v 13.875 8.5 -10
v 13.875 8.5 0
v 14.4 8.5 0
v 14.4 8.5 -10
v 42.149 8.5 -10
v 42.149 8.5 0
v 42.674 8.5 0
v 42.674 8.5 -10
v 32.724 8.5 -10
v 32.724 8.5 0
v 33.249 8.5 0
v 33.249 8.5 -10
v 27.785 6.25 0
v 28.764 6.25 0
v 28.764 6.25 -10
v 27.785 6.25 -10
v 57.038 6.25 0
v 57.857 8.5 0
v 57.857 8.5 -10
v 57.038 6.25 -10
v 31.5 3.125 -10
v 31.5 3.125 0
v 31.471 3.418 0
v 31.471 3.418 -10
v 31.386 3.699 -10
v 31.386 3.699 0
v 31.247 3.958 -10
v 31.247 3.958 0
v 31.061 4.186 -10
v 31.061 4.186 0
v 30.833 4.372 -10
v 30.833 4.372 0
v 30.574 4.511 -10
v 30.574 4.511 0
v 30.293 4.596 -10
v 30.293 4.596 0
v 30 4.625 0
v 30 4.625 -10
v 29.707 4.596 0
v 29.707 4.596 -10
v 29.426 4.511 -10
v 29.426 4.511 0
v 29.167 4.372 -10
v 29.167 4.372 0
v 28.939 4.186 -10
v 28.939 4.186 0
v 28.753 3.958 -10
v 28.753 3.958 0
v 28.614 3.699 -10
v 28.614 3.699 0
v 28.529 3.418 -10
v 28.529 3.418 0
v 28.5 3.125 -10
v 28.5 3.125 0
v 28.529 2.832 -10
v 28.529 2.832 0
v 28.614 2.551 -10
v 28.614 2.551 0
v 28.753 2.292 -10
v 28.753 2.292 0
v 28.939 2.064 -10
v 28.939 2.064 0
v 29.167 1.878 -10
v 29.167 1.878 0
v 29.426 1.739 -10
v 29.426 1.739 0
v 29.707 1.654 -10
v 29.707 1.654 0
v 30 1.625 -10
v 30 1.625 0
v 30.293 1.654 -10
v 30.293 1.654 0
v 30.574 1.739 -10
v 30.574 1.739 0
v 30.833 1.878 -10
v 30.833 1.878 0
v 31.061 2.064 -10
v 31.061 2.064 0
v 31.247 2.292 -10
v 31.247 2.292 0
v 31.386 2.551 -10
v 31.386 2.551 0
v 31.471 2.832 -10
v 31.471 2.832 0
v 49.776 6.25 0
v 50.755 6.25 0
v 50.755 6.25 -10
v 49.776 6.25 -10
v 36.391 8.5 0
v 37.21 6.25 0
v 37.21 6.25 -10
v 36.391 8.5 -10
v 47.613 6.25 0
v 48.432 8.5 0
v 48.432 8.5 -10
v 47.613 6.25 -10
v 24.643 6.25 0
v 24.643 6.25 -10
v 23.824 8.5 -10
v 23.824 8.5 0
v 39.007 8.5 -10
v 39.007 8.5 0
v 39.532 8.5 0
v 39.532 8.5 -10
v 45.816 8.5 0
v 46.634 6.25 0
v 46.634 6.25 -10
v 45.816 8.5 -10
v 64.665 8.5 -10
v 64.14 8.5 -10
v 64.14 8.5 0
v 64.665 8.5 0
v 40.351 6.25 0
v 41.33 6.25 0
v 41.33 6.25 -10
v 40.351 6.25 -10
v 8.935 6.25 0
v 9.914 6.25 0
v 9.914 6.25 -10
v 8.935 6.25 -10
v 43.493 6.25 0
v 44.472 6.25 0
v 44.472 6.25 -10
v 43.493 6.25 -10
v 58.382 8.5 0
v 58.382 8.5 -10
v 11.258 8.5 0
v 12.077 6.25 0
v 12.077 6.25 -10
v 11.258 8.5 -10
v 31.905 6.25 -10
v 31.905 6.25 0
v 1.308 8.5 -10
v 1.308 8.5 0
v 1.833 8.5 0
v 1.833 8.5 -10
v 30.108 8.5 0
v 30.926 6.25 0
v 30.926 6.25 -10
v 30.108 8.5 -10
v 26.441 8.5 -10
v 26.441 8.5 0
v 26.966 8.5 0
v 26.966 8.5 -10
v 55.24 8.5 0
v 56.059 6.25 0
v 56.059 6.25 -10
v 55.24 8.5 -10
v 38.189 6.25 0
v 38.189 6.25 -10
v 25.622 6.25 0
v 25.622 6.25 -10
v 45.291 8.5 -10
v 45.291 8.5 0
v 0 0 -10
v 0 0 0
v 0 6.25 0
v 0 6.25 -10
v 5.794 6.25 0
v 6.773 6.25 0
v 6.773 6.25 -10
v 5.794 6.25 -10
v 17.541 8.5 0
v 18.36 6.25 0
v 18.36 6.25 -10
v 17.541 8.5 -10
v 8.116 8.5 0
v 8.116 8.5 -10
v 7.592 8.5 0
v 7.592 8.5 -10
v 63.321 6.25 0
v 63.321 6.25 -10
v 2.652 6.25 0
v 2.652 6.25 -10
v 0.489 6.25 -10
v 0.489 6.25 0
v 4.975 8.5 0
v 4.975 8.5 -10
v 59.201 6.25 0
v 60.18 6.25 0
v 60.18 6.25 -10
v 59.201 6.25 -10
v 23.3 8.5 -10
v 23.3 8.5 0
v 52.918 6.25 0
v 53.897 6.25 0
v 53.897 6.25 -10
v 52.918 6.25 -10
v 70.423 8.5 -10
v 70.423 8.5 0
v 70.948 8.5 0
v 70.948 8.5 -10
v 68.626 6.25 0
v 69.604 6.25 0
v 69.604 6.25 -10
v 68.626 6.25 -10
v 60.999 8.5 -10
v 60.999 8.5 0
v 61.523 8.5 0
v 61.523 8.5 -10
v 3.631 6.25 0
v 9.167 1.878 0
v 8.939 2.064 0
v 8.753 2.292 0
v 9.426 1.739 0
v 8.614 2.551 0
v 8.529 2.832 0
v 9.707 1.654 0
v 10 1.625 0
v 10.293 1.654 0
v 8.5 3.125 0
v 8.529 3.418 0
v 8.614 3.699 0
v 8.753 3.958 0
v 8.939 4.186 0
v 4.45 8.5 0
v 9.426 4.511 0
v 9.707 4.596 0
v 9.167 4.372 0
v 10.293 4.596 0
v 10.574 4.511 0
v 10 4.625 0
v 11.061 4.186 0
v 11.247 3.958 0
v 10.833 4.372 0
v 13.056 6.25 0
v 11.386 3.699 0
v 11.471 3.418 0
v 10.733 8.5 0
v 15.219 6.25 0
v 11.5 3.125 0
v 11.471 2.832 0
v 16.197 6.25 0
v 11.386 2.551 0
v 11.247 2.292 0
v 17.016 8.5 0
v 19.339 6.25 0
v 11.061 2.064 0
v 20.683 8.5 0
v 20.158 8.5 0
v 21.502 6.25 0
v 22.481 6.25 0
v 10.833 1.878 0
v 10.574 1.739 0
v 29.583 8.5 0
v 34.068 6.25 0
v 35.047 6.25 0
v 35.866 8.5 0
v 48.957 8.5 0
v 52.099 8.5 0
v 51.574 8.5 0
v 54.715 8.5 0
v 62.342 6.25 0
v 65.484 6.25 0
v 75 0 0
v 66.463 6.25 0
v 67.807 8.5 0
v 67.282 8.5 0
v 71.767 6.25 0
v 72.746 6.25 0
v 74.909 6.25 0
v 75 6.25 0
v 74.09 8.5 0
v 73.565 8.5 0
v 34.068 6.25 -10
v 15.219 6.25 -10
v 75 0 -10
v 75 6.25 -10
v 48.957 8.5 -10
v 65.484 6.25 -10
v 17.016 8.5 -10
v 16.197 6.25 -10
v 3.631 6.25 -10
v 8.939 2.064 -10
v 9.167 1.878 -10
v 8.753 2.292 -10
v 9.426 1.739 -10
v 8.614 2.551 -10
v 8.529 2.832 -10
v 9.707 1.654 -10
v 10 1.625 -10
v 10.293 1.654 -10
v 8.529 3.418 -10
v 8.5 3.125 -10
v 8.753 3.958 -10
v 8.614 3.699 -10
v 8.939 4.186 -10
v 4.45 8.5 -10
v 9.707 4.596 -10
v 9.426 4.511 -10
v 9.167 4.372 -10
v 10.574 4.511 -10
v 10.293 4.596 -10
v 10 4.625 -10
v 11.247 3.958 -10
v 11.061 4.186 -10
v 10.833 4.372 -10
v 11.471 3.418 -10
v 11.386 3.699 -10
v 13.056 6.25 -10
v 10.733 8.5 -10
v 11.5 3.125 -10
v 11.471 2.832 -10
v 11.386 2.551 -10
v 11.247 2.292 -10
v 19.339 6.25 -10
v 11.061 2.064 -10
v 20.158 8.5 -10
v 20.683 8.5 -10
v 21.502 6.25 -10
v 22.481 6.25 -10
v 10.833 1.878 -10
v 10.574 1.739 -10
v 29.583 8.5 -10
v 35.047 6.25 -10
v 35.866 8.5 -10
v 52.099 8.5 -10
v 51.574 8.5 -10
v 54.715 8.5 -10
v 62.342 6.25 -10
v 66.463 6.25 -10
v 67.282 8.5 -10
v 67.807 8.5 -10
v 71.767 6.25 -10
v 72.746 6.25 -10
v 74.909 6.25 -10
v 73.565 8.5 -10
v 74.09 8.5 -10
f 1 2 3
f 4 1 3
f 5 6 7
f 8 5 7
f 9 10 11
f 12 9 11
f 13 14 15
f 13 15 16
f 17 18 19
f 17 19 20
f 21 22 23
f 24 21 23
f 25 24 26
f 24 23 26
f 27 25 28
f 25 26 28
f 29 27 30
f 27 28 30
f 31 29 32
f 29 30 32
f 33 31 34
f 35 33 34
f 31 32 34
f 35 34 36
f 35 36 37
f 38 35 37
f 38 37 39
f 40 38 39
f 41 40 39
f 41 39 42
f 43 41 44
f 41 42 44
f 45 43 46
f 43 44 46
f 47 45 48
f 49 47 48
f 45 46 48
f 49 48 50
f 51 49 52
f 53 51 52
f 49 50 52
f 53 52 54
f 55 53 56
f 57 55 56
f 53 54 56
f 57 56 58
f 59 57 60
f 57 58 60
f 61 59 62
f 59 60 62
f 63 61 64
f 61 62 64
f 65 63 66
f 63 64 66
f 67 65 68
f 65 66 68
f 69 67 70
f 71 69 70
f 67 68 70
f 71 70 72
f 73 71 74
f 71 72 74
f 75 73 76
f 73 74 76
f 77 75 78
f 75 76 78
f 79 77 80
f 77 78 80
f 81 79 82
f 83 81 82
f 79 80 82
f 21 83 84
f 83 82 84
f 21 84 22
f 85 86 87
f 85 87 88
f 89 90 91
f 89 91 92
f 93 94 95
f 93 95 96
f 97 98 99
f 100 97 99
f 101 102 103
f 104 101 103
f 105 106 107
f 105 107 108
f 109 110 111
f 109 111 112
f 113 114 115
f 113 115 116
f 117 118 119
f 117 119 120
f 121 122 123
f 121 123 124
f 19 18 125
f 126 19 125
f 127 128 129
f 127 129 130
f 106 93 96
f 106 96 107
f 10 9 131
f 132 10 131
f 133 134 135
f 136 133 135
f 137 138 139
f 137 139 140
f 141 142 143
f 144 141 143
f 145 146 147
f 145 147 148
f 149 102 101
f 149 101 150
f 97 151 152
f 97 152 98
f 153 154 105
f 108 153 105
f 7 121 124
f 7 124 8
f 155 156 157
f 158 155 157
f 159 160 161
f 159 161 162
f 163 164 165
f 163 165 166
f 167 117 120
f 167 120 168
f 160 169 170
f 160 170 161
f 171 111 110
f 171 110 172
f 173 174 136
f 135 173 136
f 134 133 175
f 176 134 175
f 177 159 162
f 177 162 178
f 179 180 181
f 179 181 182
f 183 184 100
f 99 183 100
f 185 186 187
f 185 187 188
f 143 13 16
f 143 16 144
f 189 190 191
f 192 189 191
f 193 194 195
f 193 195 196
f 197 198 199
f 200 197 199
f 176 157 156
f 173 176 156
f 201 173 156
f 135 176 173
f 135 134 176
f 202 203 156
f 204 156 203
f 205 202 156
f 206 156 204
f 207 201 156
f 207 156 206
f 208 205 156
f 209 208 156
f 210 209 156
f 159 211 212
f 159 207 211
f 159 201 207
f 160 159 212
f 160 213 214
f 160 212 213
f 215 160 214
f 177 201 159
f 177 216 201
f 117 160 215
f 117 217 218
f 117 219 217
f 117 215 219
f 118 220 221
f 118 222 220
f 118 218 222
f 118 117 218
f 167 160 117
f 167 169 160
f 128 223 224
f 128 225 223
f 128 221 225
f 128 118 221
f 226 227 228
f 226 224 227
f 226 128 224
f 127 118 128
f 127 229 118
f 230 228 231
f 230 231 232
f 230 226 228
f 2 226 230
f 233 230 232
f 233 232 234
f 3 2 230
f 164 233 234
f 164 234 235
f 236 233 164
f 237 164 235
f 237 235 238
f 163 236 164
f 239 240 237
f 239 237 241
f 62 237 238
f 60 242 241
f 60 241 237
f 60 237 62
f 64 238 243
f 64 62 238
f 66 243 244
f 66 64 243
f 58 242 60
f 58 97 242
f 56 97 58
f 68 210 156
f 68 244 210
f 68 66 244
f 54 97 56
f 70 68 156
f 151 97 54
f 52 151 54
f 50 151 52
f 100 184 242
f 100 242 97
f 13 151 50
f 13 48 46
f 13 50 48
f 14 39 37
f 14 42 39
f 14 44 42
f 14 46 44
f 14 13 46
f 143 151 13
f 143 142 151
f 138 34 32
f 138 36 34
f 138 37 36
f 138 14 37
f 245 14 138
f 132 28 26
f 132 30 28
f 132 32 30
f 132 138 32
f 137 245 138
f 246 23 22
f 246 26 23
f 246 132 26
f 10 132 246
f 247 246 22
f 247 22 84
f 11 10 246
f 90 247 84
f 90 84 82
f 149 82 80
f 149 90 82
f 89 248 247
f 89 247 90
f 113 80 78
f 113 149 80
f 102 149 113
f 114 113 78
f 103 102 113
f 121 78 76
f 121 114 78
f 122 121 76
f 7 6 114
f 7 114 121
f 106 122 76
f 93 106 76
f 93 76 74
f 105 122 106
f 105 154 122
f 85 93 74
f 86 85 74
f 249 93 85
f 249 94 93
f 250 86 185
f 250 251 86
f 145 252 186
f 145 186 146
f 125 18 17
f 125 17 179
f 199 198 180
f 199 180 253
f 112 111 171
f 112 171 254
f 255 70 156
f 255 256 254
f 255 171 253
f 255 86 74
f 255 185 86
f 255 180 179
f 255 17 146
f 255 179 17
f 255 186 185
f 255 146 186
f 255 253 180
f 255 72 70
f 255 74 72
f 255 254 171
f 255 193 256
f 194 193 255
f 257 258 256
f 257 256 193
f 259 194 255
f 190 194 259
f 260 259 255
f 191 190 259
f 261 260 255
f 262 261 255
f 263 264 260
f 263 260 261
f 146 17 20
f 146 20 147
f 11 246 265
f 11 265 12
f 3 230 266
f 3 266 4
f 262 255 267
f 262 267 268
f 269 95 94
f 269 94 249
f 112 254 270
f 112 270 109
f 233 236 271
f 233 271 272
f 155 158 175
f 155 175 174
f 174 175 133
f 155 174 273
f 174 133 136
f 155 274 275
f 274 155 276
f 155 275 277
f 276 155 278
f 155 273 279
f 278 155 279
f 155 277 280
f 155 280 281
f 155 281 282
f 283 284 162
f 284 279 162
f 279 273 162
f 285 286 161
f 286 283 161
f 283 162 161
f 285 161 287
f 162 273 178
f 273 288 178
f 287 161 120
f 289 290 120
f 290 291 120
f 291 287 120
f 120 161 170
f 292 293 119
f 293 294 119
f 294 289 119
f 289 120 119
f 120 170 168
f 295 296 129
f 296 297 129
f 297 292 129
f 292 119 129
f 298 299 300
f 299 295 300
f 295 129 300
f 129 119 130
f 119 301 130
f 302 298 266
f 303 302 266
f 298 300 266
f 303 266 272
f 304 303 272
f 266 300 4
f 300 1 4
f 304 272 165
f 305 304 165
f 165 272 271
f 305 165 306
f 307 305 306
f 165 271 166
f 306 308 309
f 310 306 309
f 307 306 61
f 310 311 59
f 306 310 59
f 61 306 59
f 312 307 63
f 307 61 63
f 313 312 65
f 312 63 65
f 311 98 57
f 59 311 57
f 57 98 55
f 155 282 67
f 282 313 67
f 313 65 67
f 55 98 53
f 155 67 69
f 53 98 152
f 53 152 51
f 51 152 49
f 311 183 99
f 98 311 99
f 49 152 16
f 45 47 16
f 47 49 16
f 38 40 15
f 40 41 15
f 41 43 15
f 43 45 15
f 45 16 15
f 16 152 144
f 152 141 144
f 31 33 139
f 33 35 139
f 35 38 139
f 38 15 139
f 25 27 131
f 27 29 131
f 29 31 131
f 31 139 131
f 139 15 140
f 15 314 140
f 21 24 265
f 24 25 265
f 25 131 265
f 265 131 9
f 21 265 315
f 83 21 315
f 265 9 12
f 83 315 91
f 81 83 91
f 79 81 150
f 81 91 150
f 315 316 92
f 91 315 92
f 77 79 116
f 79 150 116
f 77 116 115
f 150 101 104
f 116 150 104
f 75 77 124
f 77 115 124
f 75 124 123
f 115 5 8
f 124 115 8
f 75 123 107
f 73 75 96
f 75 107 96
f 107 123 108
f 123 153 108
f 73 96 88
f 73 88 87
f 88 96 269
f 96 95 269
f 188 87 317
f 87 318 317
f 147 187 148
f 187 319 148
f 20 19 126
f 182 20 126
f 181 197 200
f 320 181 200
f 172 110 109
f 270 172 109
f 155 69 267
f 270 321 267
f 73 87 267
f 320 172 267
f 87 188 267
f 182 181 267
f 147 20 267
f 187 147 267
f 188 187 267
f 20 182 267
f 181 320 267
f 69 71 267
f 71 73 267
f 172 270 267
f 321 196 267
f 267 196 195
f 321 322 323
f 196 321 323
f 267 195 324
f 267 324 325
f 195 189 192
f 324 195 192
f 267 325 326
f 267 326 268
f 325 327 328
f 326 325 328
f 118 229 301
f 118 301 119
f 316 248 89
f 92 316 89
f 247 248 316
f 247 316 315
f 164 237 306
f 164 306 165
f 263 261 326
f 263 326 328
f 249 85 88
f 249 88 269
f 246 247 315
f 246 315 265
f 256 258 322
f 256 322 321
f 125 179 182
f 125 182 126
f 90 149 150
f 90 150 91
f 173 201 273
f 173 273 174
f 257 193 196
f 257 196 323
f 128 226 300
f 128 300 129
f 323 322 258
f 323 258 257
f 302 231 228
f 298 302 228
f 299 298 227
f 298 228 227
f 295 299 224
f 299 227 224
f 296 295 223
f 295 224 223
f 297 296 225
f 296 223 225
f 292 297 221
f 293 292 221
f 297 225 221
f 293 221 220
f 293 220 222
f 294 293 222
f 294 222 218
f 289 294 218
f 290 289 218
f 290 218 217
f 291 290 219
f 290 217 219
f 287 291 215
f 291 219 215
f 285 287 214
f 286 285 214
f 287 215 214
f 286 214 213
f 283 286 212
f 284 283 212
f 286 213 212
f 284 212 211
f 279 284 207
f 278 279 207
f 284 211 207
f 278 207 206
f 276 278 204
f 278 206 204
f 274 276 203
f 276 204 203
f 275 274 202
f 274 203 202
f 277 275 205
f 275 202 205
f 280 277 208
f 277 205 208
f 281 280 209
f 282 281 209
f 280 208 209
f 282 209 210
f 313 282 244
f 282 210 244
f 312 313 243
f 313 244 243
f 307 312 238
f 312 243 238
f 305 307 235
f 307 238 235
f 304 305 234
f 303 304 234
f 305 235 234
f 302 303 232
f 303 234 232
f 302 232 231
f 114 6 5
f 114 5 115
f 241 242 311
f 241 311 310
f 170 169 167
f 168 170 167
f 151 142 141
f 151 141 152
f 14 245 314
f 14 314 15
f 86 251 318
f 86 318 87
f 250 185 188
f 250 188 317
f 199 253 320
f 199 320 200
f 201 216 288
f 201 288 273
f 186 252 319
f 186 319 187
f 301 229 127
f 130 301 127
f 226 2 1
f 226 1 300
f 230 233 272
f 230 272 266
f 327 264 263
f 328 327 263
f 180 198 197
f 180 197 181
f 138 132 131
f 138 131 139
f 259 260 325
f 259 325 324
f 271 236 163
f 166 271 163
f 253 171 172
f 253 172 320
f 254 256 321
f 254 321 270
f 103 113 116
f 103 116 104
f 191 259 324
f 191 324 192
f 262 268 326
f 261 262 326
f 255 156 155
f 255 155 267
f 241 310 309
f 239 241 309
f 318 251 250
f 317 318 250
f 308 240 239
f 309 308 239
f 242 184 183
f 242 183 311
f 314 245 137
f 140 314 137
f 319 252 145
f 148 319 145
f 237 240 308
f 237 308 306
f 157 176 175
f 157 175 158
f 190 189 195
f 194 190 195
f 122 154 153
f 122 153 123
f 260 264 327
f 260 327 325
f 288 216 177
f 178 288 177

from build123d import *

# Parameters (mm, degrees)
BLANKSKE_W         = 75
BLANKSKE_H         = 8.5
BLANK_DEPTH        = 10
TOOTHCUTSIM_DEPTH  = 77.139674284
TEETHCUTS_COUNT    = 25
TEETHCUTS_PITCH    = 3.14159265
SKETCH1_R          = 1.5
CUT_EXTRUDE1_DEPTH = 10


with BuildPart() as part:
    # BlankSke → Blank (new body)
    with BuildSketch(Plane.XY):
        with Locations((37.5, 4.25)):
            Rectangle(BLANKSKE_W, BLANKSKE_H)
    extrude(amount=-BLANK_DEPTH)

    # TooCutSkeSim → ToothCutSim (cut, through all)
    with BuildSketch(Plane.XY):
        Polygon((0.48943537, 6.25), (-0.48943537, 6.25), (-1.317613241, 8.5254), (1.317613241, 8.5254), align=None)
    toothcutsim = extrude(amount=-TOOTHCUTSIM_DEPTH, mode=Mode.SUBTRACT)

    # TeethCuts: ToothCutSim ×25
    with Locations(*[(i * TEETHCUTS_PITCH, 0, 0) for i in range(1, TEETHCUTS_COUNT)]):
        add(toothcutsim, mode=Mode.SUBTRACT)

    # Sketch1 → Cut-Extrude1 (cut)
    with BuildSketch(Plane.XY):
        with Locations((10, 3.125)):
            Circle(SKETCH1_R)
        with Locations((30, 3.125)):
            Circle(SKETCH1_R)
    extrude(amount=-CUT_EXTRUDE1_DEPTH, mode=Mode.SUBTRACT)


solid = part.part
